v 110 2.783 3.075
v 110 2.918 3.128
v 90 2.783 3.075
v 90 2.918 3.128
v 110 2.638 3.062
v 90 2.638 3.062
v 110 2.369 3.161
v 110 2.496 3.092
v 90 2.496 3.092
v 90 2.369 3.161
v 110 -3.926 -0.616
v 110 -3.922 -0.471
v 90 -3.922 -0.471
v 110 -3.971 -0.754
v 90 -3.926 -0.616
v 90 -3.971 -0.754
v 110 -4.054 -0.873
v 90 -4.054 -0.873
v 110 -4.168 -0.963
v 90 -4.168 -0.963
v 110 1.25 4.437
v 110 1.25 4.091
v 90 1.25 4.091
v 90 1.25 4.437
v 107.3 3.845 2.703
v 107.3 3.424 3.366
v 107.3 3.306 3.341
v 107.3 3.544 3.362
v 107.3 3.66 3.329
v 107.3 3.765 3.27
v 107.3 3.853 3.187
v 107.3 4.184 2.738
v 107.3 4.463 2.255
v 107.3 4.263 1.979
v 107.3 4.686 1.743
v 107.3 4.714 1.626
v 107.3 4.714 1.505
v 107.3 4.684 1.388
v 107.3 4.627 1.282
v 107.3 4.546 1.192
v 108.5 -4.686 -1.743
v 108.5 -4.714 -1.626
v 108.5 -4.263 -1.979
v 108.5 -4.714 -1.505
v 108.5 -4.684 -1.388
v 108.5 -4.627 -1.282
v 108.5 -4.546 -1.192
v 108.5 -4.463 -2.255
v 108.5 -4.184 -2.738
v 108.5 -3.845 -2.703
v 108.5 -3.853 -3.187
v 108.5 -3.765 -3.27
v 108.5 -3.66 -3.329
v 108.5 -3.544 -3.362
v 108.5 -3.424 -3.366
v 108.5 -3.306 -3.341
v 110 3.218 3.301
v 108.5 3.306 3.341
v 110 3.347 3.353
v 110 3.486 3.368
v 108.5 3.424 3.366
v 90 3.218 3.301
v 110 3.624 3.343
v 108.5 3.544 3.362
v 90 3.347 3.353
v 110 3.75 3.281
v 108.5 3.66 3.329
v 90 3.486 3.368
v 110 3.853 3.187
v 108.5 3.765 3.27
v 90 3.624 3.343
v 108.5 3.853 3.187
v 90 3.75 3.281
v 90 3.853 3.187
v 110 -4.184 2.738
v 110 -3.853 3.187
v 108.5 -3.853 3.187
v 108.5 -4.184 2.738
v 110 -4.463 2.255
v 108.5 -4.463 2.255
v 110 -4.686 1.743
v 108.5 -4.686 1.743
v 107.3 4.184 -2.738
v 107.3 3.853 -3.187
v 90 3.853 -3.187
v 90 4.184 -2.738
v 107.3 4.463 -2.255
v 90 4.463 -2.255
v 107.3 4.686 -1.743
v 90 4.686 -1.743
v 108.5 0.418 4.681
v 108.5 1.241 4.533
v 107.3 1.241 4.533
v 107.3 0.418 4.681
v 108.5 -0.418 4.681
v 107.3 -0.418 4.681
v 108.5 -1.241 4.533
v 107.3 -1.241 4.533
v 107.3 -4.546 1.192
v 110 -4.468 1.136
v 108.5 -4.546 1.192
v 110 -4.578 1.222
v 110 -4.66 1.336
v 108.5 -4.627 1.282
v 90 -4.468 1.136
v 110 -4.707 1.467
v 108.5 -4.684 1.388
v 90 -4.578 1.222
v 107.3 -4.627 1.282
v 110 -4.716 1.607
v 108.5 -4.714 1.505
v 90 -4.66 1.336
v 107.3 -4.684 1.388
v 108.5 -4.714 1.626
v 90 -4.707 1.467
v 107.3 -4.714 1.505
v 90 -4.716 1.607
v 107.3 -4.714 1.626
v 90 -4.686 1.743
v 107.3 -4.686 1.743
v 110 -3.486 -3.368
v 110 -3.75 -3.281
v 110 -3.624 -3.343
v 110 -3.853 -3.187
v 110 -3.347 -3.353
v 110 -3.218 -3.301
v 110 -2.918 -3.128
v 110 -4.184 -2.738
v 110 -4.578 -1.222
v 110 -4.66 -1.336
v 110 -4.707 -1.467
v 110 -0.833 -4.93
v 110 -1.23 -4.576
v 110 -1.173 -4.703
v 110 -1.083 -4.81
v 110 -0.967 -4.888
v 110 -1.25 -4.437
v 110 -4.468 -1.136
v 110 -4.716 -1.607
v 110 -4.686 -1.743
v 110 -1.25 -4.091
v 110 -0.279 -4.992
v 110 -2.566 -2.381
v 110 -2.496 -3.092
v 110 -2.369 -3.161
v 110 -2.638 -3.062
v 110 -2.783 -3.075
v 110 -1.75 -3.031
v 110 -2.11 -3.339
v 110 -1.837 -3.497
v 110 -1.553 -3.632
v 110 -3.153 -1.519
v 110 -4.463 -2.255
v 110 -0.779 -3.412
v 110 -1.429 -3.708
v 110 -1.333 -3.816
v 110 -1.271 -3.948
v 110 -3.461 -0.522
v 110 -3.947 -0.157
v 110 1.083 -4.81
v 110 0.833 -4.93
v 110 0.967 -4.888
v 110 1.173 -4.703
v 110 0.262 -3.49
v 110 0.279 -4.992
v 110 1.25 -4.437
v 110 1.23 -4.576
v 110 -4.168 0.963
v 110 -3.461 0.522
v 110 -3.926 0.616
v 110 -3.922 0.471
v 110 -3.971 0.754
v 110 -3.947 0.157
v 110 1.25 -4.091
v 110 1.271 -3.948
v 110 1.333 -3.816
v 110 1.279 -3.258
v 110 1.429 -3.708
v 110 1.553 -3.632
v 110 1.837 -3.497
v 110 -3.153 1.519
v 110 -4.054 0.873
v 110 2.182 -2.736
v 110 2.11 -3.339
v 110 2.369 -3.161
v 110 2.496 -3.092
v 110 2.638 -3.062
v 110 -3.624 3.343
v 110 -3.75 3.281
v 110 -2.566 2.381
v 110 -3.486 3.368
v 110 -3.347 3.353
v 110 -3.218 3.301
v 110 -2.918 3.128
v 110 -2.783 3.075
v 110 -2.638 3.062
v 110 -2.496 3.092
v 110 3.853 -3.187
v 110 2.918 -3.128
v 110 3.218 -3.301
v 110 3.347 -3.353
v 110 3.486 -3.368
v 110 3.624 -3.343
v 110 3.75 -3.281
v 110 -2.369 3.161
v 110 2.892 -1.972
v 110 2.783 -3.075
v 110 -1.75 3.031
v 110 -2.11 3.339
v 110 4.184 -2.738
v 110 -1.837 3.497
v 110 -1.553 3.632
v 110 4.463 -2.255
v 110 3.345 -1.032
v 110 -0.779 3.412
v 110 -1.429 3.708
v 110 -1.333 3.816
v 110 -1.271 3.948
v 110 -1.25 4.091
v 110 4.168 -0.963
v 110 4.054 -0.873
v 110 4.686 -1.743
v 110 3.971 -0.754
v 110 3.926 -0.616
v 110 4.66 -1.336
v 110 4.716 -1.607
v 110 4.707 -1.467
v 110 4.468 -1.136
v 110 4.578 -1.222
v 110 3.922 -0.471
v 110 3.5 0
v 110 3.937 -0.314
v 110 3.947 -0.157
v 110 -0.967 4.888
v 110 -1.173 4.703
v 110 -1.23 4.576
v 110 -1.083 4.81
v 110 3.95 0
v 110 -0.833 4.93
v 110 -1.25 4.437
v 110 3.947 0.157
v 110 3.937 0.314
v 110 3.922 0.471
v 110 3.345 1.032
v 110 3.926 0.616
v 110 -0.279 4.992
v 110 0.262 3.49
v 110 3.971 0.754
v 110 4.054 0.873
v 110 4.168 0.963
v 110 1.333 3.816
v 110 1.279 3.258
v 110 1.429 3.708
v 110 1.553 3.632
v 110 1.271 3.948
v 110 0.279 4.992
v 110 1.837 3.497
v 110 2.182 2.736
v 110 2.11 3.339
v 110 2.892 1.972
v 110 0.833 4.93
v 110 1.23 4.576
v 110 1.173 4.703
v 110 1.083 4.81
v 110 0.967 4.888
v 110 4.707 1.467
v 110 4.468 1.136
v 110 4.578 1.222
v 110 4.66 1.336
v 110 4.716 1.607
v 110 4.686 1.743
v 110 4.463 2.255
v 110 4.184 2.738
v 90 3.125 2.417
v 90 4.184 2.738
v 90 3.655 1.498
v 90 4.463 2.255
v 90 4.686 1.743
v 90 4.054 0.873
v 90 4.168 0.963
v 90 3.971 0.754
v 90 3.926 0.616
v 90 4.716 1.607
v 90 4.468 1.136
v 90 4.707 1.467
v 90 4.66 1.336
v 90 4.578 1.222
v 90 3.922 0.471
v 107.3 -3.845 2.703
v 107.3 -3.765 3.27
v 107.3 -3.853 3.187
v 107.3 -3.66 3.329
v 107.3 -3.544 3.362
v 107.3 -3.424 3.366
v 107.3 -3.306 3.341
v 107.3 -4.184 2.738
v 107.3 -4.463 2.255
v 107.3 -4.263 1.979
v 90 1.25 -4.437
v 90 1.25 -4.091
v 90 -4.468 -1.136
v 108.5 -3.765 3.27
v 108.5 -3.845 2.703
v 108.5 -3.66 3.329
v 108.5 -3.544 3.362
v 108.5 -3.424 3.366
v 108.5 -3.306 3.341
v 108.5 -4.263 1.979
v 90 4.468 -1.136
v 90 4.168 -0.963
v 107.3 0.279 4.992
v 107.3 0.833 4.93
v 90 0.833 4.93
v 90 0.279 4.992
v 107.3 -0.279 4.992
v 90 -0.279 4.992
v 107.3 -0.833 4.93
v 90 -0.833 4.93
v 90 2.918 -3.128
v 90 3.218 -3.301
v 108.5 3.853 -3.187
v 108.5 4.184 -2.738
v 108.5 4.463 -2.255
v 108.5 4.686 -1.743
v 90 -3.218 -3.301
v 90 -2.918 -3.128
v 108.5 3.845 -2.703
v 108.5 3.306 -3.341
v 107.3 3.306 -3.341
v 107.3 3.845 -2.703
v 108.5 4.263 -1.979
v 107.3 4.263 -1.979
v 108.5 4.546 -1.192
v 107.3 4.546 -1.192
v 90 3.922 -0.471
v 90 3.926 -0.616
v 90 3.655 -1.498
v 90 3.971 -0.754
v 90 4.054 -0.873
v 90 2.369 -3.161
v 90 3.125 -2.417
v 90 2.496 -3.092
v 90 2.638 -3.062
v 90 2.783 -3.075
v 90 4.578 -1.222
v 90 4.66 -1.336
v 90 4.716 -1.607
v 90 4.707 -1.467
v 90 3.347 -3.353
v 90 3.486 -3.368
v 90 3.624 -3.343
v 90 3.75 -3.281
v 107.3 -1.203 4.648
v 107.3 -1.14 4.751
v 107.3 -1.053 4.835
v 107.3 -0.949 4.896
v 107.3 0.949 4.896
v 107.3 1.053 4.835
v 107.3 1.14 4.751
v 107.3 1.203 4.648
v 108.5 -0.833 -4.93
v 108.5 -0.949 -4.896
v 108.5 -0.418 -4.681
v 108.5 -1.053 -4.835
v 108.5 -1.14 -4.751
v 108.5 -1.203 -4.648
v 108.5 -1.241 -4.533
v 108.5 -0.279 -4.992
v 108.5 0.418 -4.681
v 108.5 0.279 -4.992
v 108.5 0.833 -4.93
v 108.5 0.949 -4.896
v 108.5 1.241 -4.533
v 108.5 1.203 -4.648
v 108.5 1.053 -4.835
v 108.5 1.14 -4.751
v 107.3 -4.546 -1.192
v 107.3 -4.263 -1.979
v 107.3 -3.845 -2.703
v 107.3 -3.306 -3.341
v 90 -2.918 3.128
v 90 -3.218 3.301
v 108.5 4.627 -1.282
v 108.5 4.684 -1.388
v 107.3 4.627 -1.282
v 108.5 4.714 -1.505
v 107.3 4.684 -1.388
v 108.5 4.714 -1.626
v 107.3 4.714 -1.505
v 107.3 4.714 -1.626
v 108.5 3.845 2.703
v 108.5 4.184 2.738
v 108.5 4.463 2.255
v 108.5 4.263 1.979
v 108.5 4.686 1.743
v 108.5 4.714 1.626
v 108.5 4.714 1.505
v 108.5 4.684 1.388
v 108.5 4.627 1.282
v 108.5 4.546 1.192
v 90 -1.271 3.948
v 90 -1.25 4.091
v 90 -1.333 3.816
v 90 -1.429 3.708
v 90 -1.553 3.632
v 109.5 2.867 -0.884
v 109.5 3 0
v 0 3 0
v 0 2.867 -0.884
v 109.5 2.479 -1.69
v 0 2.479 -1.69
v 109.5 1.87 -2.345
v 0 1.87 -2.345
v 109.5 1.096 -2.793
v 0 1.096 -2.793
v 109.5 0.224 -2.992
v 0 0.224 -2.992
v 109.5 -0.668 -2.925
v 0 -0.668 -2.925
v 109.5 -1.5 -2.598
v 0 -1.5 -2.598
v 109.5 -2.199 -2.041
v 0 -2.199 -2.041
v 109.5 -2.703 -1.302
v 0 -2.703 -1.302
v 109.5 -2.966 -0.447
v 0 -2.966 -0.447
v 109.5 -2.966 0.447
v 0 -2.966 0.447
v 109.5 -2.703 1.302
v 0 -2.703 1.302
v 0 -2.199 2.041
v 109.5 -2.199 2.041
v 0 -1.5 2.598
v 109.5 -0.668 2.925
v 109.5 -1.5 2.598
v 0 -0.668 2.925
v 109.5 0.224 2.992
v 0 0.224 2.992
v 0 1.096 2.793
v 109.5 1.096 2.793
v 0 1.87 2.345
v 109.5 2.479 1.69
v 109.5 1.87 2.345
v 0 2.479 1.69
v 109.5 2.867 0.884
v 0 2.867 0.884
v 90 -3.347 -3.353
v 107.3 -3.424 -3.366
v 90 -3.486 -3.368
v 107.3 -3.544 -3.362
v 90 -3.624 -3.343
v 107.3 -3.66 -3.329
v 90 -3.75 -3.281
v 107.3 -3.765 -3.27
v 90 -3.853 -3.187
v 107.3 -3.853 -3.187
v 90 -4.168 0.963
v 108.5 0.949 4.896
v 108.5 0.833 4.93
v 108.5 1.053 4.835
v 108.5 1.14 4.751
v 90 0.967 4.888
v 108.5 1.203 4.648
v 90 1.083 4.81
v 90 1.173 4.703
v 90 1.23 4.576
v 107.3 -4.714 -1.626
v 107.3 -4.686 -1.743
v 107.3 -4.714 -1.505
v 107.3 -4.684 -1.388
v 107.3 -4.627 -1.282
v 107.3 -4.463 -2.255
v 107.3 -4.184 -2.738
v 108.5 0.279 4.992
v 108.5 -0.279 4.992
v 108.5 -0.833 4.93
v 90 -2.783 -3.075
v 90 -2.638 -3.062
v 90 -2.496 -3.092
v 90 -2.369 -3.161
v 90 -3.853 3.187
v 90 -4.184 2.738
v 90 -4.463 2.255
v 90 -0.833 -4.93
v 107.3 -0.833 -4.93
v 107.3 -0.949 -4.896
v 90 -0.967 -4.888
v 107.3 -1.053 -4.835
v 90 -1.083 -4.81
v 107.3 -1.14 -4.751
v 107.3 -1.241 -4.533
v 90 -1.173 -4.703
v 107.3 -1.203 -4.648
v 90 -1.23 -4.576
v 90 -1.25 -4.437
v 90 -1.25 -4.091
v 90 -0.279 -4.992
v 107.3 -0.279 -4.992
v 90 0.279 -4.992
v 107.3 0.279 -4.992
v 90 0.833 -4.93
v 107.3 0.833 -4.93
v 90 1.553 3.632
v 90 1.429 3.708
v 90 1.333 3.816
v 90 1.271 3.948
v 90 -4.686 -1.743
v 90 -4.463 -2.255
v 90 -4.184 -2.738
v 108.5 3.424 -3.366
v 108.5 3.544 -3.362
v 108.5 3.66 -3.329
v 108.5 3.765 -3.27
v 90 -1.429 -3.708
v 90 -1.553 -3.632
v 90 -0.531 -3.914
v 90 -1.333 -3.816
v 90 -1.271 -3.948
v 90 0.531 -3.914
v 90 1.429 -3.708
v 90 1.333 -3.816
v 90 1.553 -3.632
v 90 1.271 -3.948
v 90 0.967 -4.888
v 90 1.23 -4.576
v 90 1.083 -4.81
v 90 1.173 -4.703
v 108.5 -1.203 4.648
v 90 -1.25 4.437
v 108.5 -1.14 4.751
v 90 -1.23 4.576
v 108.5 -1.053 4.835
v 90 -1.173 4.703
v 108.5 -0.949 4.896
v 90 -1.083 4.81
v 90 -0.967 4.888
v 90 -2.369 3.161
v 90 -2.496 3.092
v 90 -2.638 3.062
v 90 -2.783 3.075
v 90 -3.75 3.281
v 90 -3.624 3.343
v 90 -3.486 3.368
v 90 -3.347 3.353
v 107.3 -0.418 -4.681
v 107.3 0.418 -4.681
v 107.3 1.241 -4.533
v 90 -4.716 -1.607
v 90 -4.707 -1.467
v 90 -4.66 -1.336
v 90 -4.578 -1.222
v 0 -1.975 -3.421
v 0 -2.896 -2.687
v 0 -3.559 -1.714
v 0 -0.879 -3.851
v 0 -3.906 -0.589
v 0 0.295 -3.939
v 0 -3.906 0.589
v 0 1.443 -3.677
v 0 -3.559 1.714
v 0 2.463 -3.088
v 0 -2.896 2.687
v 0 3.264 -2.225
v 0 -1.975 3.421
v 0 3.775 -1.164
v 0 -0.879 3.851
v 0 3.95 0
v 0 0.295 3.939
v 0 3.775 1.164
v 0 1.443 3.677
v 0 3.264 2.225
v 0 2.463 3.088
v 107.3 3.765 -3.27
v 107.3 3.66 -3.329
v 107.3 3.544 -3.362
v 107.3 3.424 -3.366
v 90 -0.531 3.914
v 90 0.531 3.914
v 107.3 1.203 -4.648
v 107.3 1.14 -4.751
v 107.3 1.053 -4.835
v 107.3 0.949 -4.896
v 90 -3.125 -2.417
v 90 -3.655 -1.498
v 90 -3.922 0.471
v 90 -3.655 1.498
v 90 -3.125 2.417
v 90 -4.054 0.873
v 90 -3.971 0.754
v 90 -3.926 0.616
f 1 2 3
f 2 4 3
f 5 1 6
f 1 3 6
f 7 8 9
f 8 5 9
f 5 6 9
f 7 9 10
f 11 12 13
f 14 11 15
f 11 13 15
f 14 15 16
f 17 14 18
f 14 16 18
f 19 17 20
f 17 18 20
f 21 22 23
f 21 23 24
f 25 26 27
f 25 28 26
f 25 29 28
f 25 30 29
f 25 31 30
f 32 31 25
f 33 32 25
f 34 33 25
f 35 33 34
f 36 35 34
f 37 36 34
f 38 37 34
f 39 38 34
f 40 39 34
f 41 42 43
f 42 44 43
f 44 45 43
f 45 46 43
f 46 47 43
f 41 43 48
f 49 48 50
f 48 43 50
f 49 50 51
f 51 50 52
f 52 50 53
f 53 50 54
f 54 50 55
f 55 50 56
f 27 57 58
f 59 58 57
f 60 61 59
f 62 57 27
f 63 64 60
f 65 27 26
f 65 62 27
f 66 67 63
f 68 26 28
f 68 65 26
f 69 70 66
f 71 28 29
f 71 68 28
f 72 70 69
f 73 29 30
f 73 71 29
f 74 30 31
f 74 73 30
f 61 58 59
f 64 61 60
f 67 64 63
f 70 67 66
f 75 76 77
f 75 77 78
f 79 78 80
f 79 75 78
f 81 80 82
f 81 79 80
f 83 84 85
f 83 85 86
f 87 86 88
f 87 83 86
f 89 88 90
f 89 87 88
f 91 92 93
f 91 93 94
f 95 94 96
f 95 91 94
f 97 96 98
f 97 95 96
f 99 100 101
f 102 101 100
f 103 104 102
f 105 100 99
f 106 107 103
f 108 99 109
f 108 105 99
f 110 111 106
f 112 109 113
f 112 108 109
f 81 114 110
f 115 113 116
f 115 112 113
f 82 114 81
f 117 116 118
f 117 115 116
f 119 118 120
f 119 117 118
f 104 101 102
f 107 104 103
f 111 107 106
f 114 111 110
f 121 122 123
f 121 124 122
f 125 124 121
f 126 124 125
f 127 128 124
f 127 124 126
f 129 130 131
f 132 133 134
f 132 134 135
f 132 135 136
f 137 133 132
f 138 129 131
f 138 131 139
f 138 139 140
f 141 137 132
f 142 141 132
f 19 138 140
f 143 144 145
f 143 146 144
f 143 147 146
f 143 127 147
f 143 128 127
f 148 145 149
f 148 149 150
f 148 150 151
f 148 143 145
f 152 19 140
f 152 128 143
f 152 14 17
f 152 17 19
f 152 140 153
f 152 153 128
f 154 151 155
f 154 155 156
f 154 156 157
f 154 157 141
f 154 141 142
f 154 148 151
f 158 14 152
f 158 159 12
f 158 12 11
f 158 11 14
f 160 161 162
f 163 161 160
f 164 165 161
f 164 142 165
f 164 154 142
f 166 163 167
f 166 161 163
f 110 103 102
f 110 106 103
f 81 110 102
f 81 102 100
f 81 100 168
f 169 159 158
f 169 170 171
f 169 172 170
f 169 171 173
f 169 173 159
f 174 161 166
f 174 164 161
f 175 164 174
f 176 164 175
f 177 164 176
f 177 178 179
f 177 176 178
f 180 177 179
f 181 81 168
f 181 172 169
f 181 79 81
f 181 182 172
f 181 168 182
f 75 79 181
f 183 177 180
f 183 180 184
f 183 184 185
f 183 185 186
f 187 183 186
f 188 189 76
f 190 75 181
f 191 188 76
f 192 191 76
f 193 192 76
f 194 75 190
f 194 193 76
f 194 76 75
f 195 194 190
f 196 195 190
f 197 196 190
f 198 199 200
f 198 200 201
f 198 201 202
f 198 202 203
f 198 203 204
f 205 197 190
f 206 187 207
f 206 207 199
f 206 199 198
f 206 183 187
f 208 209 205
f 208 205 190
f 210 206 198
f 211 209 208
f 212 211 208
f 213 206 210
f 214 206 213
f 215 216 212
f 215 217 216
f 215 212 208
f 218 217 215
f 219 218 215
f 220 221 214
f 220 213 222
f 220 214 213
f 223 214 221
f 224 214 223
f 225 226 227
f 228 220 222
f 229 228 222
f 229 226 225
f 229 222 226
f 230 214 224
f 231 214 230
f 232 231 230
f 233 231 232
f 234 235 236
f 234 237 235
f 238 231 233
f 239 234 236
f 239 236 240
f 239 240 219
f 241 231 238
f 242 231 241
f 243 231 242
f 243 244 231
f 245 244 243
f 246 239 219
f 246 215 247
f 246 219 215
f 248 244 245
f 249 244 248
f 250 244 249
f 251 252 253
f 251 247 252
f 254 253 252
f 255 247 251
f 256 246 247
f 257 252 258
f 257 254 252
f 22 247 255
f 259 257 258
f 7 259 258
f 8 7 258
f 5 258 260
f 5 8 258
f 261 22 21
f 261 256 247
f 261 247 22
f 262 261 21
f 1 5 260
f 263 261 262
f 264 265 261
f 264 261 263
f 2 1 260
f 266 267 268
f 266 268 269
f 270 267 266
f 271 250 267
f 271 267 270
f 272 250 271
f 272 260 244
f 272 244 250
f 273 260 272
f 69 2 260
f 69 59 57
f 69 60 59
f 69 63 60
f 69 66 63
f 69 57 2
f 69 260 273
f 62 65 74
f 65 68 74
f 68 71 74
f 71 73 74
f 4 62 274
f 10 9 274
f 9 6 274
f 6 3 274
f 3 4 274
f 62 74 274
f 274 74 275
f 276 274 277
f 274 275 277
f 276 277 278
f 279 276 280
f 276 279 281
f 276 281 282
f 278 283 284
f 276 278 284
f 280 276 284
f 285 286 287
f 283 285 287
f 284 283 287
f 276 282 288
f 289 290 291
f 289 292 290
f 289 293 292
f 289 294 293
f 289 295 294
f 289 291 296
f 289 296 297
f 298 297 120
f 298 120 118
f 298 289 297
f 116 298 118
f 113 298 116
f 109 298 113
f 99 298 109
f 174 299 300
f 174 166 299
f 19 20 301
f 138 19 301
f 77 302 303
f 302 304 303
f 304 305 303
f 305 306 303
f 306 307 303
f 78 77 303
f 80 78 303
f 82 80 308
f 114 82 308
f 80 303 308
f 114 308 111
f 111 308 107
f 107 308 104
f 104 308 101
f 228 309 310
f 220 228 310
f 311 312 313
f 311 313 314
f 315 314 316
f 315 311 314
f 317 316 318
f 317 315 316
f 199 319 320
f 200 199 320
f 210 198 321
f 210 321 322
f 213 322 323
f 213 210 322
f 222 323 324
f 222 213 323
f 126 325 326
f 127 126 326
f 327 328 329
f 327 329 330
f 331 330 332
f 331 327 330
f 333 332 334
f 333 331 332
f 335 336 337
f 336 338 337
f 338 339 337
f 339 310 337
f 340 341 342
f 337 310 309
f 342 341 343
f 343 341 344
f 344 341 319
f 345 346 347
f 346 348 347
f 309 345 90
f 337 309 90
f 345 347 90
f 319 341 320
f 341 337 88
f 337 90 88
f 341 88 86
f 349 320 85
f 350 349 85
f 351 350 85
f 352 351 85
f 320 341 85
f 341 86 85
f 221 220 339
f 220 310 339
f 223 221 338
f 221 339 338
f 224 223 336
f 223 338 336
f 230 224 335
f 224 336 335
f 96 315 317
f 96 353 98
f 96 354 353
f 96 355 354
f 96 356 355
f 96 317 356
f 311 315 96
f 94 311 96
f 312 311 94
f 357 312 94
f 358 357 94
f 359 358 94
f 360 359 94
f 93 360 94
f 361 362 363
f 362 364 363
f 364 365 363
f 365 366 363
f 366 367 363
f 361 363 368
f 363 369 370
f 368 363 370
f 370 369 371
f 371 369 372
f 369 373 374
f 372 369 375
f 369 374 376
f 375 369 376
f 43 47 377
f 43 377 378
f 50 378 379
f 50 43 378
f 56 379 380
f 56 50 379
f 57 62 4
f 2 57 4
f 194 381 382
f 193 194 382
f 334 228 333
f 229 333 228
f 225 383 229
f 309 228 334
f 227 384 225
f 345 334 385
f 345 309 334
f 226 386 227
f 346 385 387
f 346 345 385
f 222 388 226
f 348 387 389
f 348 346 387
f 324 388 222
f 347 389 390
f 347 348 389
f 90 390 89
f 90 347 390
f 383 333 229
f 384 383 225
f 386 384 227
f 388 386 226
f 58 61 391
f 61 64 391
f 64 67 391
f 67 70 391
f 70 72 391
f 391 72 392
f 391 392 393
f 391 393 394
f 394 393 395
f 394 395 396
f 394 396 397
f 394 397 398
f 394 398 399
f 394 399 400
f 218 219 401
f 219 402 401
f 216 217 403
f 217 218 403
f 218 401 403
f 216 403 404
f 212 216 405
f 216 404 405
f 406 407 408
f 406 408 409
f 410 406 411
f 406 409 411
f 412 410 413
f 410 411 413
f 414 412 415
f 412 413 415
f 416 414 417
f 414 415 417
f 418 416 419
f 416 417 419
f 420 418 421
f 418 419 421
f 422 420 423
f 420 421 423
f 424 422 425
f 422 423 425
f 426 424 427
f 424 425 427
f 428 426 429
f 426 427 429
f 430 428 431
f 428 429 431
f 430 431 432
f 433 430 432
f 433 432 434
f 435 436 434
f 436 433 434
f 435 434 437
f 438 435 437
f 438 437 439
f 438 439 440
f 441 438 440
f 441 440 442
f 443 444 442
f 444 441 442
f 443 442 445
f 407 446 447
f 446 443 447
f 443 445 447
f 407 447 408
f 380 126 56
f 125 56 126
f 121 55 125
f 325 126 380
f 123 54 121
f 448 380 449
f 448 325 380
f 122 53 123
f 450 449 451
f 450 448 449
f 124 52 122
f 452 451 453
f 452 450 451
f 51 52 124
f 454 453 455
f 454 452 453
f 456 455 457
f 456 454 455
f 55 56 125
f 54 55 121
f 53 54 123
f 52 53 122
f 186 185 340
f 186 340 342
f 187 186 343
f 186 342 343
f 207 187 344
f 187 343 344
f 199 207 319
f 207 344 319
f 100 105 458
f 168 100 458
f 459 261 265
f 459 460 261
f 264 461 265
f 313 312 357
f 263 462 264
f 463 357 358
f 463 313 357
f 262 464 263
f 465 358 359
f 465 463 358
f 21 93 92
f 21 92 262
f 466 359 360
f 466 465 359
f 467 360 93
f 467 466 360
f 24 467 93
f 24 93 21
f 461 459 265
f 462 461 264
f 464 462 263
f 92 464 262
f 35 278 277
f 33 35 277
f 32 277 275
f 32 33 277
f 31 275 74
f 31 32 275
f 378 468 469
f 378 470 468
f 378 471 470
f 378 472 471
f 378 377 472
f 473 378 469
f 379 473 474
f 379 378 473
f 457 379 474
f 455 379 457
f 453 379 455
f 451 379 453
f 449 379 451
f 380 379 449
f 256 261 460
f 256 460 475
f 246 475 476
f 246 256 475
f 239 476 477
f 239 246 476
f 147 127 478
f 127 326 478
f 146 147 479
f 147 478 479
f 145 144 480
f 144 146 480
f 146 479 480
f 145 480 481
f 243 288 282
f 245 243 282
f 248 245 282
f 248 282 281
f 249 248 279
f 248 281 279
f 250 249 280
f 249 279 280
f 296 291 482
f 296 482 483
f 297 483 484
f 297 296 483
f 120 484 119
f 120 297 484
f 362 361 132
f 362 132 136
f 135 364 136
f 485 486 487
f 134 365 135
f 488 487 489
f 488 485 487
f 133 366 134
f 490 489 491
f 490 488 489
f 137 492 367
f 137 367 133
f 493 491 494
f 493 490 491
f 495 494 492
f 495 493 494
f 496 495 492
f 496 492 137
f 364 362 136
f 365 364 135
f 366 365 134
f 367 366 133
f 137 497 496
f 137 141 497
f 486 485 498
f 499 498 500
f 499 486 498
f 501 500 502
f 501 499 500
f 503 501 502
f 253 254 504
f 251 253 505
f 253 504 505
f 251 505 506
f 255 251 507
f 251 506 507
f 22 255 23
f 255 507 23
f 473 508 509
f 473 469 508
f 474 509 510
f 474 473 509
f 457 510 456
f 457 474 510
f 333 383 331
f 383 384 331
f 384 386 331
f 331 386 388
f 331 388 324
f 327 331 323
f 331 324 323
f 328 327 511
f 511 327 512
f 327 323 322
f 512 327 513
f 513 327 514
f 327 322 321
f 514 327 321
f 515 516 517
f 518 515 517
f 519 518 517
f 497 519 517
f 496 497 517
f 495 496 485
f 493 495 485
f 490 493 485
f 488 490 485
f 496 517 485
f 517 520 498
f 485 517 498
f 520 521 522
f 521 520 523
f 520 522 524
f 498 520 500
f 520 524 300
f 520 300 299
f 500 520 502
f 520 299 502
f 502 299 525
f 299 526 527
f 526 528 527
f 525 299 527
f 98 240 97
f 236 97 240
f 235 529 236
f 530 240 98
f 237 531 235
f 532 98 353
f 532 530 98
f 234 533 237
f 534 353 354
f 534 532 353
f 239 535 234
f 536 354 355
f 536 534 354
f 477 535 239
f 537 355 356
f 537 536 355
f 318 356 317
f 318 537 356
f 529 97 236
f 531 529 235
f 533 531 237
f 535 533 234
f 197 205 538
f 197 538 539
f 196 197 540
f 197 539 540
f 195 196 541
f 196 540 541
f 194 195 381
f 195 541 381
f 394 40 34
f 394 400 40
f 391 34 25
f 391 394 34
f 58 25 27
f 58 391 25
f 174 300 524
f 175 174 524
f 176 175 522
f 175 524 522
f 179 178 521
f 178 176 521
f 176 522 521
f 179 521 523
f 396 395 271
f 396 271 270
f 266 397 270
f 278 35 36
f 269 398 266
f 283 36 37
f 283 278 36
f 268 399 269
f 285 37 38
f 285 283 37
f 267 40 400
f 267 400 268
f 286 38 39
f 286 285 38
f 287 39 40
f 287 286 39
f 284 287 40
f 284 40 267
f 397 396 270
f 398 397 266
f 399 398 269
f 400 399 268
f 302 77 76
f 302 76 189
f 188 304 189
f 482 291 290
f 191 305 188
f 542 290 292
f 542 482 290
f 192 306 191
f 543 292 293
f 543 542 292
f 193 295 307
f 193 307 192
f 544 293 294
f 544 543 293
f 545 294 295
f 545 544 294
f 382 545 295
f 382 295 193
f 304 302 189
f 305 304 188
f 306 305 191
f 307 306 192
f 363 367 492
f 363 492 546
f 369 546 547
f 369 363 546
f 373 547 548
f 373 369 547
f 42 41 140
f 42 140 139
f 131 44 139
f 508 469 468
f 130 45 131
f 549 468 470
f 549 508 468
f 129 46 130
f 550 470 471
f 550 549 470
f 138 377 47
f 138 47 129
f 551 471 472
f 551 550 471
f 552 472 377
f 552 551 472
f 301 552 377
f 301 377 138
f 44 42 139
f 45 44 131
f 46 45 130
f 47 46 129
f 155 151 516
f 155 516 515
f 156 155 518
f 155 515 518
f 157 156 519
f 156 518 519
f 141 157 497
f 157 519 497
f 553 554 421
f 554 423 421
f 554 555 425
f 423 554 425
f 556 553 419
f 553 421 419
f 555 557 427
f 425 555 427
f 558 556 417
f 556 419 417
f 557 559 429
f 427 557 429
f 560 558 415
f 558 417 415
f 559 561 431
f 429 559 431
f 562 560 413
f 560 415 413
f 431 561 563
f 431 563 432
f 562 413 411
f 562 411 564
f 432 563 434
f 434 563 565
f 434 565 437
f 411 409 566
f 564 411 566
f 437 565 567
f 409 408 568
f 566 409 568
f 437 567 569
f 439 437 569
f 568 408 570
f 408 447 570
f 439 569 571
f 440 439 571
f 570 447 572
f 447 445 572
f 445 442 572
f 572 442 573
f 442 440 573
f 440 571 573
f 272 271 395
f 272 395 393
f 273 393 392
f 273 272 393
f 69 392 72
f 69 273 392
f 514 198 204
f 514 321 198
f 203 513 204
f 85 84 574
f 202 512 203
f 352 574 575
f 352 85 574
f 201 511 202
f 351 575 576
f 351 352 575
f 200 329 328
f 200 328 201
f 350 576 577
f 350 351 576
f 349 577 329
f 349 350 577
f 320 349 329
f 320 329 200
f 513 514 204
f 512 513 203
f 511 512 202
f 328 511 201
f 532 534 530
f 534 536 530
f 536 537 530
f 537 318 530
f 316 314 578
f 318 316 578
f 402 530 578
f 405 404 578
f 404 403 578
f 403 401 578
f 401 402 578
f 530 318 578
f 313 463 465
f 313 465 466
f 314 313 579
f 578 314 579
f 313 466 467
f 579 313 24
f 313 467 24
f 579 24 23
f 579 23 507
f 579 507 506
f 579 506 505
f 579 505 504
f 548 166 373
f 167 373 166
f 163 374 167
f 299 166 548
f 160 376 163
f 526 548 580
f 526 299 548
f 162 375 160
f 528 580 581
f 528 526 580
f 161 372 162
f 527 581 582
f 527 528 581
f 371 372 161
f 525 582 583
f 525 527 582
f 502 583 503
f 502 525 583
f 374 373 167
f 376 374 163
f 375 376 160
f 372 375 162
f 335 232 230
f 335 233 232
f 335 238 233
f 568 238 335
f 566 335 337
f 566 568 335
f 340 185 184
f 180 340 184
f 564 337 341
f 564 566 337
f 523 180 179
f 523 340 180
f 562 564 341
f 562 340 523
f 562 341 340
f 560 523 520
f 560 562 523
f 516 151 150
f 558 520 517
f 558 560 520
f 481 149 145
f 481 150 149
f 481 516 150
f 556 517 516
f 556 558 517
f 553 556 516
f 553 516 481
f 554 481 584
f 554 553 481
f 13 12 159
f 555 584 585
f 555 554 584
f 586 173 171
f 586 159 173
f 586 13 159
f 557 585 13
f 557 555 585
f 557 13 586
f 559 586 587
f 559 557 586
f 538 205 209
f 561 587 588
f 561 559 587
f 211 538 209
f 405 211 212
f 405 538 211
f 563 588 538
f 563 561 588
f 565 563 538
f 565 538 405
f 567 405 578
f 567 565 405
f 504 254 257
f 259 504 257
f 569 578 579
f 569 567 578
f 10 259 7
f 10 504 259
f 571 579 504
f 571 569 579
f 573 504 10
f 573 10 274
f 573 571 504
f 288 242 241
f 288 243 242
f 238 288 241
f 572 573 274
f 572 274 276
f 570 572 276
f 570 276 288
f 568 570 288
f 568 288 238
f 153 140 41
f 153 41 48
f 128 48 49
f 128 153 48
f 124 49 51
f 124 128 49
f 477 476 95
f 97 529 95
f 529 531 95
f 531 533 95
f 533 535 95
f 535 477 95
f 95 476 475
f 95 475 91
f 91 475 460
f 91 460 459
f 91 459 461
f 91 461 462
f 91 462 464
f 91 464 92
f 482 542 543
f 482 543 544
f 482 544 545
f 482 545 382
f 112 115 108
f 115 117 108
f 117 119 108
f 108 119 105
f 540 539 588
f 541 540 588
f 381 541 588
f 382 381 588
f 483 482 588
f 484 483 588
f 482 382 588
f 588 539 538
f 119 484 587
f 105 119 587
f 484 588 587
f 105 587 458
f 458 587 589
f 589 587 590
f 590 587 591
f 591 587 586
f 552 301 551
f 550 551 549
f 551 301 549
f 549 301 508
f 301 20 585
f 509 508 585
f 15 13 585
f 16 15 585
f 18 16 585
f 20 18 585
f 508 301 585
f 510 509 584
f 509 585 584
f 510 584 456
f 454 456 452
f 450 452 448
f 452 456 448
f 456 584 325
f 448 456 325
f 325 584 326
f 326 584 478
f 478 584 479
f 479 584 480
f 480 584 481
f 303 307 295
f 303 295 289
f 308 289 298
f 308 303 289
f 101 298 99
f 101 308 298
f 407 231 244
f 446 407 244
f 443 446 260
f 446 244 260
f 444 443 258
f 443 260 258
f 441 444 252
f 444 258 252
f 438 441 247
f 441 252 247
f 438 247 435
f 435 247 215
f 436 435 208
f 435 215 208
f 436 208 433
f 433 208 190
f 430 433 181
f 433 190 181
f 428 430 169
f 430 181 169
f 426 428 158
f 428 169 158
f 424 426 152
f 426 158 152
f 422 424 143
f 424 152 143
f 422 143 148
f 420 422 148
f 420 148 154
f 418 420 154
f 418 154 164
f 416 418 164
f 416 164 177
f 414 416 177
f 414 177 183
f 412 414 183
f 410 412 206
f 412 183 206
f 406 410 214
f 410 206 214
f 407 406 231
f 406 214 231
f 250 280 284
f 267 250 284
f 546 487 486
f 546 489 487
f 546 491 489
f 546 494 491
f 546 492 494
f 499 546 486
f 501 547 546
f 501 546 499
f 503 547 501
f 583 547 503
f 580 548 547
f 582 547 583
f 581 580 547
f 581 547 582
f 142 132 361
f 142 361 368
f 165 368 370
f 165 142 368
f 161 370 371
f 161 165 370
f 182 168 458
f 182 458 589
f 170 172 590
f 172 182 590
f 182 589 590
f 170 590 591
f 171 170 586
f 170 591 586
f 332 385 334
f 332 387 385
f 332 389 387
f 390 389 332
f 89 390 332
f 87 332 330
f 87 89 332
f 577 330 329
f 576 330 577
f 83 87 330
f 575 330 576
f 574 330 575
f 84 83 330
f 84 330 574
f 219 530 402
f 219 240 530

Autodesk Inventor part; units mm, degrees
ref_plane "YZ Plane" through (0, 0, 0) normal (1, 0, 0) x (0, 1, 0)
ref_plane "XZ Plane" through (0, 0, 0) normal (0, 1, 0) x (-1, 0, 0)
sketch "Sketch1" plane through (0, 0, 0) normal (1, 0, 0) x (0, 1, 0)
  circle A0 centre (0, 0) radius 3.95
  circle A1 centre (0, 0) radius 3
  dimension "d0" = 7.9
  dimension "d1" = 6
extrude "Extrusion1" add sketch "Sketch1" along normal blind 110
sketch "Sketch2" plane through (110, 0, 0) normal (1, 0, 0) x (0, 0, -1)
  line L0 (-0.0955, 0) -> (3.95, 0) construction
  circle A0 centre (0, 0) radius 3.95 projected
  line L1 (4.8412, 1.25) -> (0, 1.25)
  line L2 (0, 1.25) -> (0, -1.25) construction
  line L3 (0, -1.25) -> (4.8412, -1.25)
  line L4 (4.8412, -1.25) -> (4.8412, 1.25) construction
  line L5 (4.8412, 1.25) -> (0, -1.25) construction
  line L6 (0, 1.25) -> (4.8412, -1.25) construction
  circle A1 centre (0, 0) radius 5
  line L7 (-0.0477, -0.0827) -> (1.975, 3.4208) construction
  line L8 (1.3381, 4.8176) -> (-1.0825, 0.625)
  line L9 (-1.0825, 0.625) -> (1.0825, -0.625) construction
  line L10 (1.0825, -0.625) -> (3.5031, 3.5676)
  line L11 (3.5031, 3.5676) -> (1.3381, 4.8176) construction
  line L12 (1.3381, 4.8176) -> (1.0825, -0.625) construction
  line L13 (-1.0825, 0.625) -> (3.5031, 3.5676) construction
  line L14 (0.0477, -0.0827) -> (-1.975, 3.4208) construction
  line L15 (-3.5031, 3.5676) -> (-1.0825, -0.625)
  line L16 (-1.0825, -0.625) -> (1.0825, 0.625) construction
  line L17 (1.0825, 0.625) -> (-1.3381, 4.8176)
  line L18 (-1.3381, 4.8176) -> (-3.5031, 3.5676) construction
  line L19 (-3.5031, 3.5676) -> (1.0825, 0.625) construction
  line L20 (-1.0825, -0.625) -> (-1.3381, 4.8176) construction
  line L21 (0.0955, 0) -> (-3.95, 0) construction
  line L22 (-4.8412, -1.25) -> (0, -1.25)
  line L23 (0, -1.25) -> (0, 1.25) construction
  line L24 (0, 1.25) -> (-4.8412, 1.25)
  line L25 (-4.8412, 1.25) -> (-4.8412, -1.25) construction
  line L26 (-4.8412, -1.25) -> (0, 1.25) construction
  line L27 (0, -1.25) -> (-4.8412, 1.25) construction
  line L28 (0.0477, 0.0827) -> (-1.975, -3.4208) construction
  line L29 (-1.3381, -4.8176) -> (1.0825, -0.625)
  line L30 (1.0825, -0.625) -> (-1.0825, 0.625) construction
  line L31 (-1.0825, 0.625) -> (-3.5031, -3.5676)
  line L32 (-3.5031, -3.5676) -> (-1.3381, -4.8176) construction
  line L33 (-1.3381, -4.8176) -> (-1.0825, 0.625) construction
  line L34 (1.0825, -0.625) -> (-3.5031, -3.5676) construction
  line L35 (-0.0477, 0.0827) -> (1.975, -3.4208) construction
  line L36 (3.5031, -3.5676) -> (1.0825, 0.625)
  line L37 (1.0825, 0.625) -> (-1.0825, -0.625) construction
  line L38 (-1.0825, -0.625) -> (1.3381, -4.8176)
  line L39 (1.3381, -4.8176) -> (3.5031, -3.5676) construction
  line L40 (3.5031, -3.5676) -> (-1.0825, -0.625) construction
  line L41 (1.0825, 0.625) -> (1.3381, -4.8176) construction
  point P0 (2.4206, 0)
  point P1 (1.2103, 2.0963)
  point P2 (-1.2103, 2.0963)
  point P3 (-2.4206, 0)
  point P4 (-1.2103, -2.0963)
  point P5 (1.2103, -2.0963)
  point P6 (-2.956, -2.62)
  point P7 (-3.5031, -3.5676)
  point P8 (-1.3381, -4.8176)
  point P9 (-0.791, -3.87)
  point P10 (0.791, -3.87)
  point P11 (1.3381, -4.8176)
  point P12 (3.5031, -3.5676)
  point P13 (2.956, -2.62)
  point P14 (4.8412, 1.25)
  point P15 (3.747, 1.25)
  point P16 (3.747, -1.25)
  point P17 (2.956, 2.62)
  point P18 (3.5031, 3.5676)
  point P19 (1.3381, 4.8176)
  point P20 (0.791, 3.87)
  point P21 (-3.747, 1.25)
  point P22 (-4.8412, -1.25)
  point P23 (-3.747, -1.25)
  point P24 (-0.791, 3.87)
  point P25 (-1.3381, 4.8176)
  point P26 (-3.5031, 3.5676)
  point P27 (-2.956, 2.62)
  dimension "d23" = 10
  dimension "d21" = 2.5
  dimension "d26" = 360
extrude "Extrusion2" add sketch "Sketch2" against normal blind 20 contours A0 L1 A1 L3 | A0 L8 A1 L10 | L36 A1 L38 A0 | A0 L15 A1 L17 | L29 A1 L31 A0 | A0 L22 A1 L24
fillet "Fillet1" radius 0.5 24 edges at (100, 4.8176, 1.3381) (100, 3.5676, 3.5031) (100, 4.8176, -1.3381) (100, 3.5676, -3.5031) (100, 1.25, -4.8412) (100, -1.25, -4.8412) (100, -3.5676, -3.5031) (100, -4.8176, -1.3381) (100, -4.8176, 1.3381) (100, -3.5676, 3.5031) (100, -1.25, 4.8412) (100, 1.25, 4.8412) (100, 3.87, -0.791) (100, 3.87, 0.791) (100, 2.62, -2.956) (100, 1.25, -3.747) (100, -1.25, -3.747) (100, -2.62, -2.956) (100, -3.87, -0.791) (100, -3.87, 0.791) (100, -2.62, 2.956) (100, -1.25, 3.747) (100, 1.25, 3.747) (100, 2.62, 2.956)
ref_plane "Work Plane1" through (108.5, 0, 0) normal (1, 0, 0) x (0, 0, -1)
sketch "Sketch4" plane through (108.5, 0, 0) normal (1, 0, 0) x (0, 0, -1)
  arc A0 (3.6317, -1.5534) -> (3.6317, 1.5534) centre (0, 0) ccw projected
  circle A1 centre (0, 0) radius 10
  circle A2 centre (0, 0) radius 4.7
  arc A3 (0.4706, 3.9219) -> (-0.4706, 3.9219) centre (0, 0) ccw projected
  point P0 (5.7956, 1.5529)
  point P1 (5.7956, -1.5529)
  point P2 (6, 0)
  point P3 (3.747, -1.25)
  point P4 (3.747, 1.25)
  dimension "d14" = 20
  dimension "d29" = 9.4
extrude "Extrusion4" cut sketch "Sketch4" against normal blind 1.2
chamfer "Chamfer1" distance 0.5 angle 45 1 edges at (110, -3, 0)
sketch "Sketch3" plane through (0, 0, 0) normal (0, 1, 0) x (-1, 0, 0)
  line L0 (0, 0) -> (-110, 0) construction
  line L1 (-110, -3) -> (-110, 3) projected
  circle A0 centre (-3.95, 0) radius 1.5
  circle A1 centre (-3.95, 0) radius 3.95
  line L2 (0, 3.95) -> (-90, 3.95) projected
  line L3 (0, 3.95) -> (0, -3.95) projected
  line L4 (-7.9, -3.95) -> (0, -3.95)
  line L5 (0, -3.95) -> (0, 3.95)
  line L6 (0, 3.95) -> (-7.9, 3.95)
  line L7 (-7.9, 3.95) -> (-7.9, -3.95)
  line L8 (-7.9, -3.95) -> (0, 3.95) construction
  line L9 (0, -3.95) -> (-7.9, 3.95) construction
  point P0 (-3.95, 3.95)
  point P1 (-3.95, -3.95)
  point P2 (0, -3.95)
  dimension "d10" = 3
sketch "Sketch5" plane through (0, 0, 0) normal (0, 0, 1) x (1, 0, 0)
  line L0 (0, -3.95) -> (0, 3.95) projected
  line L1 (90, 2.3685) -> (110, 2.3685) projected
  line L2 (90, 2.3685) -> (90, 3.9219) projected
  line L3 (110, 3.9219) -> (90, 3.9219) projected
  line L4 (110, 3.9219) -> (110, 3.9219) projected
  line L5 (90, 3.9219) -> (110, 3.9219) projected
  line L6 (90, 3.9219) -> (90, 2.3685) projected
  line L7 (110, 2.3685) -> (90, 2.3685) projected
  line L8 (110, 1.5534) -> (110, 2.3685) projected
  line L9 (90, 1.5534) -> (110, 1.5534) projected
  line L10 (90, 1.5534) -> (90, -1.5534) projected
  line L11 (110, -1.5534) -> (90, -1.5534) projected
  line L12 (110, -2.3685) -> (110, -1.5534) projected
  line L13 (90, -2.3685) -> (110, -2.3685) projected
  line L14 (90, -2.3685) -> (90, -3.9219) projected
  line L15 (110, -3.9219) -> (90, -3.9219) projected
  line L16 (110, -3.9219) -> (110, -3.9219) projected
  line L17 (90, -3.9219) -> (110, -3.9219) projected
  line L18 (90, -3.9219) -> (90, -2.3685) projected
  line L19 (110, -2.3685) -> (90, -2.3685) projected
  line L20 (110, -1.5534) -> (110, -2.3685) projected
  line L21 (90, -1.5534) -> (110, -1.5534) projected
  line L22 (90, -1.5534) -> (90, 1.5534) projected
  line L23 (110, 1.5534) -> (90, 1.5534) projected
  line L24 (110, 2.3685) -> (110, 1.5534) projected
  line L25 (3.95, 3.6541) -> (3.95, -3.6541) construction
  line L26 (3.95, -3.6541) -> (3.95, 3.6541)
  line L27 (2.45, 0) -> (5.45, 0) construction
  line L28 (2.45, -2) -> (5.45, -2)
  line L29 (5.45, 2) -> (2.45, 2)
  arc A0 (2.45, 2) -> (2.45, -2) centre (2.45, 0) ccw
  arc A1 (5.45, -2) -> (5.45, 2) centre (5.45, 0) ccw
  line L30 (-2.45, 2) -> (2.45, 2)
  line L31 (2.45, 2) -> (2.45, -2)
  line L32 (2.45, -2) -> (-2.45, -2)
  line L33 (-2.45, -2) -> (-2.45, 2)
  line L34 (-2.45, 2) -> (2.45, -2) construction
  line L35 (2.45, 2) -> (-2.45, -2) construction
  point P0 (0, 0)
  point P1 (3.95, 0)
  dimension "d30" = 4
  dimension "d31" = 3
properties part number "Shaft" material "Stainless Steel"
